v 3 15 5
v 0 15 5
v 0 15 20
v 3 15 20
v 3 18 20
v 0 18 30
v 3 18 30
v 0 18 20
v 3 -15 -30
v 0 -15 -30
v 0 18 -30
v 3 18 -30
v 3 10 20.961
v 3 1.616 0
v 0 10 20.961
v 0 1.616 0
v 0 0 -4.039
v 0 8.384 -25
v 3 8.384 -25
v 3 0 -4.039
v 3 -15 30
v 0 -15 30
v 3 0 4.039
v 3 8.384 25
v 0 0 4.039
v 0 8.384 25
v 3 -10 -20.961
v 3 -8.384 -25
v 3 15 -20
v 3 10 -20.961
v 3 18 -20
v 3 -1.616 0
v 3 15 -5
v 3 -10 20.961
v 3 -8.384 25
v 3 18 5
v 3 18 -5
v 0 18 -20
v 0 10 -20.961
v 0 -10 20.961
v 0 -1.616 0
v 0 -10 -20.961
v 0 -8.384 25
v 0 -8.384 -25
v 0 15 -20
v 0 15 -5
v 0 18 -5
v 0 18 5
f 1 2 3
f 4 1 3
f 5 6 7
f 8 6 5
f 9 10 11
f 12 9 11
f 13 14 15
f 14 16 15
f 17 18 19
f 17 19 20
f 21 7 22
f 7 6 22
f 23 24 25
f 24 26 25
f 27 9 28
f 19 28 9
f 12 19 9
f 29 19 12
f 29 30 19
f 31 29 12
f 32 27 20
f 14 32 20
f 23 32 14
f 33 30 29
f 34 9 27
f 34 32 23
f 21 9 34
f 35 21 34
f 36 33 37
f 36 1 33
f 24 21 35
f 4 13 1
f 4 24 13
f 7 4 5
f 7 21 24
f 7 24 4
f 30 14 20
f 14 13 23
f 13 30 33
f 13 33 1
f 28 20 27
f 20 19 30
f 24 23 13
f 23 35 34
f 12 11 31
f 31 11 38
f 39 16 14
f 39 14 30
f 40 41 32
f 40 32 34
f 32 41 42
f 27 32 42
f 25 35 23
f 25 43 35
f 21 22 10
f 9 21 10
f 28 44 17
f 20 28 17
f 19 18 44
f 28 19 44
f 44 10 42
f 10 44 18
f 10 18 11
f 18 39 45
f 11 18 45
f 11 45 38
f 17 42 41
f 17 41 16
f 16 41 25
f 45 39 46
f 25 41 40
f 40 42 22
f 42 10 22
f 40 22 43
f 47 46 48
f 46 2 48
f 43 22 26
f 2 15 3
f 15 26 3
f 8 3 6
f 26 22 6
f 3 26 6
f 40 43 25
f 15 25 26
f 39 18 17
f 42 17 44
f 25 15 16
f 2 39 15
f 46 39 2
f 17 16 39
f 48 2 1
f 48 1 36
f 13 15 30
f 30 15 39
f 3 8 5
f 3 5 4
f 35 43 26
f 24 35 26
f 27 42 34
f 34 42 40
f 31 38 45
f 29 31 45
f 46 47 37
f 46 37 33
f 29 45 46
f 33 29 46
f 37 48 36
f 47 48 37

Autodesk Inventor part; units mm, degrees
ref_plane "YZ Plane" through (0, 0, 0) normal (1, 0, 0) x (0, 1, 0)
ref_plane "XZ Plane" through (0, 0, 0) normal (0, 1, 0) x (-1, 0, 0)
ref_plane "XY Plane" through (0, 0, 0) normal (0, 0, 1) x (1, 0, 0)
sketch "Sketch1" plane through (0, 0, 0) normal (1, 0, 0) x (0, 1, 0)
  line L0 (15, 30) -> (-15, 30)
  line L1 (-15, 30) -> (-15, -30)
  line L2 (-15, -30) -> (15, -30)
  line L3 (15, -30) -> (15, 30)
  line L4 (15, 30) -> (-15, -30) construction
  line L5 (-15, 30) -> (15, -30) construction
  line L6 (15, 30) -> (18, 30)
  line L7 (18, 30) -> (18, 20)
  line L8 (18, 20) -> (15, 20)
  line L9 (15, 20) -> (15, 30)
  line L10 (15, -30) -> (18, -30)
  line L11 (18, -30) -> (18, -20)
  line L12 (18, -20) -> (15, -20)
  line L13 (15, -20) -> (15, -30)
  line L14 (15, 5) -> (18, 5)
  line L15 (18, 5) -> (18, -5)
  line L16 (18, -5) -> (15, -5)
  line L17 (15, -5) -> (15, 5)
  point P0 (0, 0)
  point P1 (18, 0)
  point P2 (0, 0)
  dimension "d0" = 30
  dimension "d1" = 60
  dimension "d2" = 3
  dimension "d3" = 10
  dimension "d4" = 3
  dimension "d5" = 10
  dimension "d6" = 3
  dimension "d7" = 10
extrude "Extrusion1" add sketch "Sketch1" along normal blind 3
sketch "Sketch2" plane through (0, 0, 0) normal (-1, 0, 0) x (0, 0, 1)
  line L0 (25, 10) -> (-25, 10)
  line L1 (-25, 10) -> (-25, -10)
  line L2 (-25, -10) -> (25, -10)
  line L3 (25, -10) -> (25, 10)
  line L4 (25, 10) -> (-25, -10) construction
  line L5 (-25, 10) -> (25, -10) construction
  line L6 (30, -15) -> (-30, -15) projected
  line L7 (-30, -15) -> (-30, 18) projected
  point P0 (0, 0)
  dimension "d10" = 5
  dimension "d11" = 5
extrude "Extrusion2" cut sketch "Sketch2" against normal blind 3
sketch "Sketch3" plane through (0, 0, 0) normal (-1, 0, 0) x (0, 0, 1)
  line L0 (-25, -10) -> (-25, 10) projected
  line L1 (-25, 10) -> (25, 10) projected
  line L2 (25, 10) -> (25, -10) projected
  line L3 (25, -10) -> (-25, -10) projected
  line L4 (-30, -15) -> (-30, 18) projected
  line L5 (30, -15) -> (-30, -15) projected
  line L6 (30, 18) -> (30, -15) projected
  line L7 (20, 18) -> (30, 18) projected
  line L8 (20, 15) -> (20, 18) projected
  line L9 (5, 15) -> (20, 15) projected
  line L10 (5, 18) -> (5, 15) projected
  line L11 (-5, 18) -> (5, 18) projected
  line L12 (-5, 15) -> (-5, 18) projected
  line L13 (-20, 15) -> (-5, 15) projected
  line L14 (-20, 18) -> (-20, 15) projected
  line L15 (-30, 18) -> (-20, 18) projected
  line L16 (25.5571, 8.6073) -> (-24.4429, -11.3927)
  line L17 (-24.4429, -11.3927) -> (-25.5571, -8.6073)
  line L18 (-25.5571, -8.6073) -> (24.4429, 11.3927)
  line L19 (24.4429, 11.3927) -> (25.5571, 8.6073)
  line L20 (25.5571, 8.6073) -> (-25.5571, -8.6073) construction
  line L21 (-24.4429, -11.3927) -> (24.4429, 11.3927) construction
  line L22 (-25.5571, 8.6073) -> (24.4429, -11.3927)
  line L23 (24.4429, -11.3927) -> (25.5571, -8.6073)
  line L24 (25.5571, -8.6073) -> (-24.4429, 11.3927)
  line L25 (-24.4429, 11.3927) -> (-25.5571, 8.6073)
  line L26 (-25.5571, 8.6073) -> (25.5571, -8.6073) construction
  line L27 (24.4429, -11.3927) -> (-24.4429, 11.3927) construction
  point P0 (0, 0)
  dimension "d14" = 3
  dimension "d15" = 3
extrude "Extrusion3" add sketch "Sketch3" against normal blind 3 contours L17 L18 L0 | L0 L18 L22 L16 L3 | L3 L16 L17 | L22 L25 L0 | L0 L1 L24 L18 L22 | L18 L24 L16 L22 | L22 L16 L24 L2 L3 | L3 L23 L22 | L25 L24 L1 | L18 L1 L2 L16 L24 | L2 L24 L23 | L18 L19 L1 | L2 L19 L16
properties part number "Back Plate"
